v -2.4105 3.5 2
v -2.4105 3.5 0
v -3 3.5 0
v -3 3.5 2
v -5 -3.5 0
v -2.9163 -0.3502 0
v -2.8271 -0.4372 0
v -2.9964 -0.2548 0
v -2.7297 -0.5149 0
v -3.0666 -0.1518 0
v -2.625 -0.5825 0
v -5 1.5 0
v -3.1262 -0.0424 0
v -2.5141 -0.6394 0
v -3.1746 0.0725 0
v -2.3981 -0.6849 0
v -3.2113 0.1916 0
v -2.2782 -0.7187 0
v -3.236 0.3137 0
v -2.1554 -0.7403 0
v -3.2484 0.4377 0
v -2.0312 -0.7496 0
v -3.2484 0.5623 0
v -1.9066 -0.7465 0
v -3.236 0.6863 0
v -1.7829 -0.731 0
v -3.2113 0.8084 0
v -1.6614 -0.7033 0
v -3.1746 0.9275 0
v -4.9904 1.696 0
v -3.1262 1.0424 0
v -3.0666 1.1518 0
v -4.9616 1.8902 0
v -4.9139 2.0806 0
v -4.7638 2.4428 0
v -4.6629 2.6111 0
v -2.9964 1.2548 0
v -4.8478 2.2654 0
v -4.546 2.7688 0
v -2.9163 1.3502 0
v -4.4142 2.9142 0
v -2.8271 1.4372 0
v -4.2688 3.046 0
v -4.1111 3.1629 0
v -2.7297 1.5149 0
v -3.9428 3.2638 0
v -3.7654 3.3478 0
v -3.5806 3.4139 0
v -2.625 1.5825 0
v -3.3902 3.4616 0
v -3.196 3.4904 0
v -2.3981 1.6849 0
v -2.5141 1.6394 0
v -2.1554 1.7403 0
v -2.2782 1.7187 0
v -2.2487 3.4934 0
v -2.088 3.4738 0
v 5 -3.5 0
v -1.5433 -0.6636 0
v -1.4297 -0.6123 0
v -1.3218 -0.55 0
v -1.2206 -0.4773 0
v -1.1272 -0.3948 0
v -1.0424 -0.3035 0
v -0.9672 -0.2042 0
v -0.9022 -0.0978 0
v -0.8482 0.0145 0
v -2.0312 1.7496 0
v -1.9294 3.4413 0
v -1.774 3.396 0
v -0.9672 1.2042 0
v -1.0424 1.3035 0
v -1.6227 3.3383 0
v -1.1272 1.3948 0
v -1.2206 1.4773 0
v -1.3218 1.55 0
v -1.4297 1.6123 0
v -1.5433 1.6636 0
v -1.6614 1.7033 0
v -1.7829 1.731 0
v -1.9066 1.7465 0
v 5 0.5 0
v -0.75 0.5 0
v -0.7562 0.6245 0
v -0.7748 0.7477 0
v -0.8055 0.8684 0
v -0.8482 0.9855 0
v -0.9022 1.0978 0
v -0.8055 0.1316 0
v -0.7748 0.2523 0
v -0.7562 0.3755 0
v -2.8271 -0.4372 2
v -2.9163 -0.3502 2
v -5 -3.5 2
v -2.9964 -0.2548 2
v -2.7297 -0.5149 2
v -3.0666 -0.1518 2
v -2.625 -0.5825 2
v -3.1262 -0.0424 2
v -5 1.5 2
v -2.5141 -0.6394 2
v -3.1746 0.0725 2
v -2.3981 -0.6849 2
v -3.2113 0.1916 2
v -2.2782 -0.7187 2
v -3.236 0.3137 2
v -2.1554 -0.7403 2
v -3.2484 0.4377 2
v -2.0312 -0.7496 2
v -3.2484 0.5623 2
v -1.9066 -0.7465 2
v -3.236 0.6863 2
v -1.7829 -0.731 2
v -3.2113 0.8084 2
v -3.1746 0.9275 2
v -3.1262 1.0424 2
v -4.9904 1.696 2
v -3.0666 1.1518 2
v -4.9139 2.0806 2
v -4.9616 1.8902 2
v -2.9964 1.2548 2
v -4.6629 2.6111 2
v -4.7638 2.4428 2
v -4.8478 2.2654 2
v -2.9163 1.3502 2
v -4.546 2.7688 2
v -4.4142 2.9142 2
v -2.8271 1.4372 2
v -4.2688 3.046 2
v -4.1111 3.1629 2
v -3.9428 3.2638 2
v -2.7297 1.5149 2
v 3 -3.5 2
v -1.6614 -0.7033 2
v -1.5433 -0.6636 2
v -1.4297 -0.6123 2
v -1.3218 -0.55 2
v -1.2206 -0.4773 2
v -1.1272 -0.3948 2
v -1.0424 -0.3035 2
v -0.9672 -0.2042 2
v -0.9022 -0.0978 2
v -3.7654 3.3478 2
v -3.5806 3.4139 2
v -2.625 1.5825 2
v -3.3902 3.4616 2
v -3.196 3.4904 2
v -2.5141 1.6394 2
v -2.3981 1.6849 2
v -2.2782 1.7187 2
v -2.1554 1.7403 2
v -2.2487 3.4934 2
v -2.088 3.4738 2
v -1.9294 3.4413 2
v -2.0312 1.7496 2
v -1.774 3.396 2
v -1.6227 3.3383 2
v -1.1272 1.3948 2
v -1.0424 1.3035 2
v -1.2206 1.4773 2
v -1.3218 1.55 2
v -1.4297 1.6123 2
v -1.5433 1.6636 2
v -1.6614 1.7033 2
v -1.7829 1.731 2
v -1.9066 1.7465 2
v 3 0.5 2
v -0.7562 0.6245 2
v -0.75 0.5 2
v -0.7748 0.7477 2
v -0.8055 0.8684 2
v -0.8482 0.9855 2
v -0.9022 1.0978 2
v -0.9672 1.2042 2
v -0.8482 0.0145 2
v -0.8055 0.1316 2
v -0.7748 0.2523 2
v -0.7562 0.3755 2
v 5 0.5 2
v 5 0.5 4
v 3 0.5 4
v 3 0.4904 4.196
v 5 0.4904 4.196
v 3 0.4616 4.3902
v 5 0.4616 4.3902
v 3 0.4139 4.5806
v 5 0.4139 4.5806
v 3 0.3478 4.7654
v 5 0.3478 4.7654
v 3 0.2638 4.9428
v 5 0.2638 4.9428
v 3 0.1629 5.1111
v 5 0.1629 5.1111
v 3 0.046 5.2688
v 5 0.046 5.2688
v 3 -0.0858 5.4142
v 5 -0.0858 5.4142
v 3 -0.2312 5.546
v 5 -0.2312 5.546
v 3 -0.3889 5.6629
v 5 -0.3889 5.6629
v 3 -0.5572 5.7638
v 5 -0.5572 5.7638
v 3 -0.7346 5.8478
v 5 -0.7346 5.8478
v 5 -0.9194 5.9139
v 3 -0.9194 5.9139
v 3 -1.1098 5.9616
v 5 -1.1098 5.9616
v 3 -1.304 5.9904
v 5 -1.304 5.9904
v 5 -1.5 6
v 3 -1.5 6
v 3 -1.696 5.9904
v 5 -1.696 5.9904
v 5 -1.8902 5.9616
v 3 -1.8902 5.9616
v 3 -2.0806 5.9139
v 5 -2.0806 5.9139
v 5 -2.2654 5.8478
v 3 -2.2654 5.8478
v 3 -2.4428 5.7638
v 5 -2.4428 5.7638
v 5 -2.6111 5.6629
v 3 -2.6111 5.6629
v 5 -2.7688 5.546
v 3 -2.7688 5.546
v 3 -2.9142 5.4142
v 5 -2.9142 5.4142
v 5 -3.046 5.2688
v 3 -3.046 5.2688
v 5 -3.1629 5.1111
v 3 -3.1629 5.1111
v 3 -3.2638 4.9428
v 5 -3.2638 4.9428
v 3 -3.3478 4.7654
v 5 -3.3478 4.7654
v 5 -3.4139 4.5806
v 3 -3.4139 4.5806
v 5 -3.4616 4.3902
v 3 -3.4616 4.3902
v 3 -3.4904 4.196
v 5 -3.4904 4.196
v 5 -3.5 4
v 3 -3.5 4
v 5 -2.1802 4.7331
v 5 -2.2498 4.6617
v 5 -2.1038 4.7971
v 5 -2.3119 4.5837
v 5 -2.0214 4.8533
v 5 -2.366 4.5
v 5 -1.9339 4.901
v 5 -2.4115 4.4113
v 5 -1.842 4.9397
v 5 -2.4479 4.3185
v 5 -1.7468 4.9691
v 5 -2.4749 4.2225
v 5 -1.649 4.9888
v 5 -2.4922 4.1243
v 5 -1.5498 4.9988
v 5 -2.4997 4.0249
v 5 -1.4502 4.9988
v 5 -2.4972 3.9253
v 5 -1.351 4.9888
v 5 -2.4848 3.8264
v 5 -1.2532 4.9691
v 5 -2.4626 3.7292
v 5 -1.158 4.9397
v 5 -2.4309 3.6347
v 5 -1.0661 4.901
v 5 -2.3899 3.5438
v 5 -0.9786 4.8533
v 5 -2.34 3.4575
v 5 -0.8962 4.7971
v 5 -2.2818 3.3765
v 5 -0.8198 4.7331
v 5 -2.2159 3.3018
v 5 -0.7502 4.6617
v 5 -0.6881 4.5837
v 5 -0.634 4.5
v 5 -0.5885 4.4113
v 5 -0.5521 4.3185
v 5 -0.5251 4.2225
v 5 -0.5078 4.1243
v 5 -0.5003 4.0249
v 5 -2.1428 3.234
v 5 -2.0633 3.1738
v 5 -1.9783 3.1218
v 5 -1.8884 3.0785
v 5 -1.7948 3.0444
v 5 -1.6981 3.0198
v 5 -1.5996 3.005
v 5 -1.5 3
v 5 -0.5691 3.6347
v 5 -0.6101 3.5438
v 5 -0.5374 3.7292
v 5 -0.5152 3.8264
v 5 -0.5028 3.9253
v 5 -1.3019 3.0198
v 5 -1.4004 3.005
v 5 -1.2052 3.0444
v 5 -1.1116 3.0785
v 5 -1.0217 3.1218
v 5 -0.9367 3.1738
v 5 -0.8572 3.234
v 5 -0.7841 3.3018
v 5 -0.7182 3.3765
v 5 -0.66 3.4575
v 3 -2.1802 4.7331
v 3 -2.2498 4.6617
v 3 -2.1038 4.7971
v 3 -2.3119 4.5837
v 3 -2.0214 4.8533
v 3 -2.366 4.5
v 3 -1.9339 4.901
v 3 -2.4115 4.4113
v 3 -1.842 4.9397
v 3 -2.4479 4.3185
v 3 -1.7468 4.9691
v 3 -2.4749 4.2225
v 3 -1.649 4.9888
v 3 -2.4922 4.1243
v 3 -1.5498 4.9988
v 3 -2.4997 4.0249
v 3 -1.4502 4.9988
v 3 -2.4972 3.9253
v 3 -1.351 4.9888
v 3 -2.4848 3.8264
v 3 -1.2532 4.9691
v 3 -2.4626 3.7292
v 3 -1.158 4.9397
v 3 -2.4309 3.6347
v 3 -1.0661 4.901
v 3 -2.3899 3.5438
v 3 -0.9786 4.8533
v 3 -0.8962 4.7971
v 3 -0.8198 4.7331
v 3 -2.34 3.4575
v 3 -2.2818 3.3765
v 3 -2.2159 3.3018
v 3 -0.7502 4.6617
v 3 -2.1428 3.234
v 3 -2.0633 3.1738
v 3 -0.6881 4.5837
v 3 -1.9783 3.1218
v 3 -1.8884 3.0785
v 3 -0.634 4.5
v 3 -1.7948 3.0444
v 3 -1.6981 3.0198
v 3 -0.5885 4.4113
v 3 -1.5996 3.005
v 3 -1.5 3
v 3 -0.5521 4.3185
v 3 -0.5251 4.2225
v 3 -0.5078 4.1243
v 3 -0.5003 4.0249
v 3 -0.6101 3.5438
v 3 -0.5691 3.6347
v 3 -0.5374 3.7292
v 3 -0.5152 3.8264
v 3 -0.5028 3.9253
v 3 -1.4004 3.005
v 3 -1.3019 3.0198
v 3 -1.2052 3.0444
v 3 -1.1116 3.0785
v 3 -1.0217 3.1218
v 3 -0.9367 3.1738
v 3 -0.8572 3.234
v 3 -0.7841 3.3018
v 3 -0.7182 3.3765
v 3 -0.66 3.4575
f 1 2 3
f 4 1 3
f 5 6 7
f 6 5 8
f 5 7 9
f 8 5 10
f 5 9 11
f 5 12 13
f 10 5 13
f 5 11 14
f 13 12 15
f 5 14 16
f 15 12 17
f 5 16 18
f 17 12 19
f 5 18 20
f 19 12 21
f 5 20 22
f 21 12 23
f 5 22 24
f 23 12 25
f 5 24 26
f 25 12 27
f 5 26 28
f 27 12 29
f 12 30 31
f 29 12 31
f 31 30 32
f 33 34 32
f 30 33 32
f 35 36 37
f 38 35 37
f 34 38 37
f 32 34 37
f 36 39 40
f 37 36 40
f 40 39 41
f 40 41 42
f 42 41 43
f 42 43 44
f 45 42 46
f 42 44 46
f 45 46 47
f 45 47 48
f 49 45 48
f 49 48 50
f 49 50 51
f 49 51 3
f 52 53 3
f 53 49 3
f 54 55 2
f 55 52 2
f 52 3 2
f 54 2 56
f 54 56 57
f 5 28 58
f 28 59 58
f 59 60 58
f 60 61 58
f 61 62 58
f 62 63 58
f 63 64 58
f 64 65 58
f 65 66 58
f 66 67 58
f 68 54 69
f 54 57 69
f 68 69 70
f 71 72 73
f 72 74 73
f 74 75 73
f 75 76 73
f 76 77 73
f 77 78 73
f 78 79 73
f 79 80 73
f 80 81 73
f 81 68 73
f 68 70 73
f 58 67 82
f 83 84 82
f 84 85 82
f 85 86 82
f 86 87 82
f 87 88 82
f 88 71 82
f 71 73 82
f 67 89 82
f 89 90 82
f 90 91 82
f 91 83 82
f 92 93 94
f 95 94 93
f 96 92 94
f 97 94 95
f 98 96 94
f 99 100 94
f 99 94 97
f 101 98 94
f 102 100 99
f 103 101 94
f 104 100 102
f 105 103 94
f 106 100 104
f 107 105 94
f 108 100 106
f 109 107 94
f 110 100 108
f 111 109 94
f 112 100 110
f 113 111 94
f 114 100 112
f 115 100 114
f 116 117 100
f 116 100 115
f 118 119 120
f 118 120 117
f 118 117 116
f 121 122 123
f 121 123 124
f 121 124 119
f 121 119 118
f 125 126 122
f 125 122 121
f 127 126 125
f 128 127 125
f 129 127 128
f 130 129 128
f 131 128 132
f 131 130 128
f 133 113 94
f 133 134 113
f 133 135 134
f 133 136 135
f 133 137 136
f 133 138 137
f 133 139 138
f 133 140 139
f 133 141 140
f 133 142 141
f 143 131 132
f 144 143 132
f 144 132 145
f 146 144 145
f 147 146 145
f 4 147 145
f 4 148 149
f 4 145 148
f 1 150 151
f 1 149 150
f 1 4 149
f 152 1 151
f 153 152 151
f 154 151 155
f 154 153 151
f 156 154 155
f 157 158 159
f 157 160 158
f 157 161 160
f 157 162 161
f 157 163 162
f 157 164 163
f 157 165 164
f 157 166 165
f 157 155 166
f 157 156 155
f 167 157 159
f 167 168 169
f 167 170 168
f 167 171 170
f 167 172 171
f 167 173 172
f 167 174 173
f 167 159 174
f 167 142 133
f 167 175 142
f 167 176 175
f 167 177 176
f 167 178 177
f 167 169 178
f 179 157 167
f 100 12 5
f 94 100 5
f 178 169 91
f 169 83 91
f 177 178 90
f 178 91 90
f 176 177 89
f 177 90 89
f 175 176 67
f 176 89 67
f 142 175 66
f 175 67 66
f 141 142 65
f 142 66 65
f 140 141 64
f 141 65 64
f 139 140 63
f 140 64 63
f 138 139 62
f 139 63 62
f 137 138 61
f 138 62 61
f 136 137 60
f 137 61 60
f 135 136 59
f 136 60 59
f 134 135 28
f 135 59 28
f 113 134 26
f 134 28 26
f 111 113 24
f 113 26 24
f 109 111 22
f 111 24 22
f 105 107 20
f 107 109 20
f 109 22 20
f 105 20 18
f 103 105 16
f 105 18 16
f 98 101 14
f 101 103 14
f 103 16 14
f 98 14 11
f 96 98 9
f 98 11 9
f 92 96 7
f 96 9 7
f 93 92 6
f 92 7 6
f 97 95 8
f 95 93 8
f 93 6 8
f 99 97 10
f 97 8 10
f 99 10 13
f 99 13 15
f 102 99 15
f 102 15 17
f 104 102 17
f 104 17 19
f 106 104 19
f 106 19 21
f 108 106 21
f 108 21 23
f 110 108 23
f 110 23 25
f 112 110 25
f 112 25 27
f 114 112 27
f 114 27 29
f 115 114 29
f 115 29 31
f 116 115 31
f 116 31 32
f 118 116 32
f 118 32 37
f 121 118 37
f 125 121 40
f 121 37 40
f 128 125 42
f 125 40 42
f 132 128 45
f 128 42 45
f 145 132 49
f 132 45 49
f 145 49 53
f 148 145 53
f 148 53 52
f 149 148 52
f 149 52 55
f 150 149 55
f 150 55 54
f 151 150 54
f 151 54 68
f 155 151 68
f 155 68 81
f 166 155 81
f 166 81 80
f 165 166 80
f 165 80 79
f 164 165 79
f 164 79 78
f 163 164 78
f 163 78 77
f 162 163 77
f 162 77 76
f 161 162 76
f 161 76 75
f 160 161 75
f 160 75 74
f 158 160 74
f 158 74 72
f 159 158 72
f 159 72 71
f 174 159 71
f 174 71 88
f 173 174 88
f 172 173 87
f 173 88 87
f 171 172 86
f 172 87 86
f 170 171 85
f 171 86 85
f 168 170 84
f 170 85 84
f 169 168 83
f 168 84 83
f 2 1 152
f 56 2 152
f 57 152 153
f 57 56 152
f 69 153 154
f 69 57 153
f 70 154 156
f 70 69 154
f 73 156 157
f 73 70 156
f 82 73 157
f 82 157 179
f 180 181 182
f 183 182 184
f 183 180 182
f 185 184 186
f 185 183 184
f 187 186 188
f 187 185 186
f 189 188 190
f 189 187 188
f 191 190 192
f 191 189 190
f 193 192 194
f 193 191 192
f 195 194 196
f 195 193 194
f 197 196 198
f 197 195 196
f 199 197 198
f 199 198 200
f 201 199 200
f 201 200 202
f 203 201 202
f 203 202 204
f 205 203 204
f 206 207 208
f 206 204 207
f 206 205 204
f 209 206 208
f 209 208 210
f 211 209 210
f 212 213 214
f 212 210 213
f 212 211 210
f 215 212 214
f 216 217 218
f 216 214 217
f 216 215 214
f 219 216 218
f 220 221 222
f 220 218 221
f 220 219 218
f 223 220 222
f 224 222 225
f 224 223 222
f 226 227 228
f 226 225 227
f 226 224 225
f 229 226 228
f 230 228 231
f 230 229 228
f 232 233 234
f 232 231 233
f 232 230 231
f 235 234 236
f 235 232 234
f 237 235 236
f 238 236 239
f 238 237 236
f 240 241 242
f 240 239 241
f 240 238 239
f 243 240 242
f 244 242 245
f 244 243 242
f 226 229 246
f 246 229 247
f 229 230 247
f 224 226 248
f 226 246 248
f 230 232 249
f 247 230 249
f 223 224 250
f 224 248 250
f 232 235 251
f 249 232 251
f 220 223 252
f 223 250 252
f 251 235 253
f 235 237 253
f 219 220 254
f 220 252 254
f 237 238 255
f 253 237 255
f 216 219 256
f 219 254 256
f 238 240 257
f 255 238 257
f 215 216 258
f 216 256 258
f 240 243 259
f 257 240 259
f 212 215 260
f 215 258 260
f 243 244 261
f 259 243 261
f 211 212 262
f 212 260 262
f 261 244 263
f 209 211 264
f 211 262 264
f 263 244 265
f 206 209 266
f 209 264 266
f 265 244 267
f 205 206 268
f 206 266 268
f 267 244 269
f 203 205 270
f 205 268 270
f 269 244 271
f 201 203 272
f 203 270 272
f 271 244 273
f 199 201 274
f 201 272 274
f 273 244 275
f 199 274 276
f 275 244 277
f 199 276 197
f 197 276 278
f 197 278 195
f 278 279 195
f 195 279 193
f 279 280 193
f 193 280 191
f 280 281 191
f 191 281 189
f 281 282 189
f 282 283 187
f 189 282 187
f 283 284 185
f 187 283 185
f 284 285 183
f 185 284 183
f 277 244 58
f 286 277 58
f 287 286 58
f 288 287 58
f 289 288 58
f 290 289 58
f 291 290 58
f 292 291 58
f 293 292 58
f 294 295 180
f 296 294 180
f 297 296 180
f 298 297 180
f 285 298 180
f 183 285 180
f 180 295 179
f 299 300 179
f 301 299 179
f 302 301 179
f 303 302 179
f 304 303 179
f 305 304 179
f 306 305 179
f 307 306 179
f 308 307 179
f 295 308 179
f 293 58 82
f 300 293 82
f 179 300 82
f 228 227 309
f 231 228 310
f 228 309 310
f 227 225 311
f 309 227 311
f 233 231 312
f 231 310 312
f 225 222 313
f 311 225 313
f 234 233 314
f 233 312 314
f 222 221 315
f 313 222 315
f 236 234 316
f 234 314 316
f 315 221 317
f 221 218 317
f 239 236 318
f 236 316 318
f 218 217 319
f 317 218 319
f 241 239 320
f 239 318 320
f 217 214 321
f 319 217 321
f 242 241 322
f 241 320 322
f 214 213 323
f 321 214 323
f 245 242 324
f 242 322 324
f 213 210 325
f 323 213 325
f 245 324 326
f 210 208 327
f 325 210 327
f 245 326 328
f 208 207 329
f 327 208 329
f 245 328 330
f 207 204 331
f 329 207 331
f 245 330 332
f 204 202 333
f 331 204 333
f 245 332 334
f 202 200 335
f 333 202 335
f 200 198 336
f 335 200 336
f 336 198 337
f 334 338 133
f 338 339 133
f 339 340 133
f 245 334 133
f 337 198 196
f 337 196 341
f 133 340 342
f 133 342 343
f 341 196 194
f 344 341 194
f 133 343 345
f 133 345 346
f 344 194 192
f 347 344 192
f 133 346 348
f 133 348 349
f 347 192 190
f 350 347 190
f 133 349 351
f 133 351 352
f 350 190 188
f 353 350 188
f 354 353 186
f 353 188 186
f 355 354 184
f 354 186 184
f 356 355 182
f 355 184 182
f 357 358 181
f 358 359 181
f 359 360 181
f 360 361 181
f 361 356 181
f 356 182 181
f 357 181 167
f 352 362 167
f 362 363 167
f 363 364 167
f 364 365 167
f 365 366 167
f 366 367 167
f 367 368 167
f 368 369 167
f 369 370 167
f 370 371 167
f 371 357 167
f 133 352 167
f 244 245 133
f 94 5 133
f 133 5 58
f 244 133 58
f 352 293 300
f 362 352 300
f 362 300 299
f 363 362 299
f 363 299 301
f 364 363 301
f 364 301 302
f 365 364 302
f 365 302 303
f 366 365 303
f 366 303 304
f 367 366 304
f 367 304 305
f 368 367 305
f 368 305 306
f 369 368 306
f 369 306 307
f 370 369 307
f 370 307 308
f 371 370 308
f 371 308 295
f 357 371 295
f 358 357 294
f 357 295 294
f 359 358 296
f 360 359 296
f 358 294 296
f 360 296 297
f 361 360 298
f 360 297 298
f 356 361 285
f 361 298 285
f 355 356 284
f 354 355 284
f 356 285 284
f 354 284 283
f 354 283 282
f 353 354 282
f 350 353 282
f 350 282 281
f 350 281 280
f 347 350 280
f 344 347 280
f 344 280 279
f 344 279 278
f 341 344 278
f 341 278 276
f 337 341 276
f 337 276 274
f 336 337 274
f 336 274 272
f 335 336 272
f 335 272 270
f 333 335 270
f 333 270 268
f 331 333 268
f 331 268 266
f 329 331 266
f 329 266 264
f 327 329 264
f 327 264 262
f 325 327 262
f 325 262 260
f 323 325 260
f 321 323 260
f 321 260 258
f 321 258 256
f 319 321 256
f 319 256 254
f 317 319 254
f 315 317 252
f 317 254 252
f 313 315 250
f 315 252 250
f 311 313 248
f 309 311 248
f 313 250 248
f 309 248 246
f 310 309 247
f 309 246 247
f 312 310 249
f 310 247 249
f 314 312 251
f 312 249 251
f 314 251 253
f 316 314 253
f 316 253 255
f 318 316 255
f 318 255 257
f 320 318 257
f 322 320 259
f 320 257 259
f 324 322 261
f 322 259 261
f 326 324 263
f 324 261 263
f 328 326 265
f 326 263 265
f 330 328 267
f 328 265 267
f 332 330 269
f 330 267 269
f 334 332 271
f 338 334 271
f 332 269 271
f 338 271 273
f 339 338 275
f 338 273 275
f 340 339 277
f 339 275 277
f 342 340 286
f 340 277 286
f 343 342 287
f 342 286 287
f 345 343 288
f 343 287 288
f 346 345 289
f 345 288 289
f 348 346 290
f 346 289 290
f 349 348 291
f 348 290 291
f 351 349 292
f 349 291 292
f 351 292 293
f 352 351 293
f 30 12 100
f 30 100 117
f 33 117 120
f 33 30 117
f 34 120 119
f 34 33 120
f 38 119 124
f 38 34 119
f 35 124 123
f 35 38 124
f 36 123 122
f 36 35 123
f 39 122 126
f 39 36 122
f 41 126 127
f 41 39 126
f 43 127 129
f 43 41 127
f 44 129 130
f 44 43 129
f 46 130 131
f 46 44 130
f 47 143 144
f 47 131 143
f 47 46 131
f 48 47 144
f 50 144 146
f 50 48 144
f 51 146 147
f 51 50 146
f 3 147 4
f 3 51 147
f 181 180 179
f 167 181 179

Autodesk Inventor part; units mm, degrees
ref_plane "YZ Plane" through (0, 0, 0) normal (1, 0, 0) x (0, 1, 0)
ref_plane "XZ Plane" through (0, 0, 0) normal (0, 1, 0) x (-1, 0, 0)
ref_plane "XY Plane" through (0, 0, 0) normal (0, 0, 1) x (1, 0, 0)
sketch "Boceto1" plane through (0, 0, 0) normal (0, 0, 1) x (1, 0, 0)
  line L0 (-5, -3.5) -> (5, -3.5)
  line L1 (5, -3.5) -> (5, 0.5)
  line L2 (-2.4105, 3.5) -> (-3, 3.5)
  line L3 (-5, 1.5) -> (-5, -3.5)
  line L4 (-5, -3.5) -> (5, 3.5) construction
  line L5 (5, -3.5) -> (-5, 3.5) construction
  arc A0 (-3, 3.5) -> (-5, 1.5) centre (-3, 1.5) ccw
  line L6 (-1.6227, 3.3383) -> (5, 0.5)
  circle A1 centre (-2, 0.5) radius 1.25
  arc A2 (-1.6227, 3.3383) -> (-2.4105, 3.5) centre (-2.4105, 1.5) ccw
  point P0 (0, 0)
  point P1 (-2, 3.5)
  dimension "d0" = 10
  dimension "d1" = 7
  dimension "d2" = 2
  dimension "d3" = 7
  dimension "d4" = 3
  dimension "d5" = 2.5
  dimension "d6" = 3
  dimension "d7" = 4
  dimension "d10" = 2
extrude "Extrusión1" add sketch "Boceto1" along normal blind 2
sketch "Boceto2" plane through (5, -3.5, 0) normal (1, 0, 0) x (0, 0, -1)
  line L0 (0, 0) -> (-2, 0) projected
  line L1 (0, 0) -> (-4, 0)
  line L2 (-6, 2) -> (-6, 2)
  line L3 (-4, 4) -> (0, 4)
  line L4 (0, 4) -> (0, 0)
  circle A0 centre (-4, 2) radius 1
  arc A1 (-4, 4) -> (-6, 2) centre (-4, 2) ccw
  arc A2 (-6, 2) -> (-4, 0) centre (-4, 2) ccw
  point P0 (0, 3.5)
  point P1 (-6, 4)
  point P2 (-6, 0)
  dimension "d11" = 6
  dimension "d12" = 4
  dimension "d13" = 2
  dimension "d14" = 2
  dimension "d15" = 2
  dimension "d16" = 2
extrude "Extrusión2" add sketch "Boceto2" against normal blind 2
sketch "Boceto3" plane through (3, -3.5, 0) normal (-1, 0, 0) x (0, 0, -1)
  point P0 (0, 3.5)
properties part number "Lab2A01209499P15"
